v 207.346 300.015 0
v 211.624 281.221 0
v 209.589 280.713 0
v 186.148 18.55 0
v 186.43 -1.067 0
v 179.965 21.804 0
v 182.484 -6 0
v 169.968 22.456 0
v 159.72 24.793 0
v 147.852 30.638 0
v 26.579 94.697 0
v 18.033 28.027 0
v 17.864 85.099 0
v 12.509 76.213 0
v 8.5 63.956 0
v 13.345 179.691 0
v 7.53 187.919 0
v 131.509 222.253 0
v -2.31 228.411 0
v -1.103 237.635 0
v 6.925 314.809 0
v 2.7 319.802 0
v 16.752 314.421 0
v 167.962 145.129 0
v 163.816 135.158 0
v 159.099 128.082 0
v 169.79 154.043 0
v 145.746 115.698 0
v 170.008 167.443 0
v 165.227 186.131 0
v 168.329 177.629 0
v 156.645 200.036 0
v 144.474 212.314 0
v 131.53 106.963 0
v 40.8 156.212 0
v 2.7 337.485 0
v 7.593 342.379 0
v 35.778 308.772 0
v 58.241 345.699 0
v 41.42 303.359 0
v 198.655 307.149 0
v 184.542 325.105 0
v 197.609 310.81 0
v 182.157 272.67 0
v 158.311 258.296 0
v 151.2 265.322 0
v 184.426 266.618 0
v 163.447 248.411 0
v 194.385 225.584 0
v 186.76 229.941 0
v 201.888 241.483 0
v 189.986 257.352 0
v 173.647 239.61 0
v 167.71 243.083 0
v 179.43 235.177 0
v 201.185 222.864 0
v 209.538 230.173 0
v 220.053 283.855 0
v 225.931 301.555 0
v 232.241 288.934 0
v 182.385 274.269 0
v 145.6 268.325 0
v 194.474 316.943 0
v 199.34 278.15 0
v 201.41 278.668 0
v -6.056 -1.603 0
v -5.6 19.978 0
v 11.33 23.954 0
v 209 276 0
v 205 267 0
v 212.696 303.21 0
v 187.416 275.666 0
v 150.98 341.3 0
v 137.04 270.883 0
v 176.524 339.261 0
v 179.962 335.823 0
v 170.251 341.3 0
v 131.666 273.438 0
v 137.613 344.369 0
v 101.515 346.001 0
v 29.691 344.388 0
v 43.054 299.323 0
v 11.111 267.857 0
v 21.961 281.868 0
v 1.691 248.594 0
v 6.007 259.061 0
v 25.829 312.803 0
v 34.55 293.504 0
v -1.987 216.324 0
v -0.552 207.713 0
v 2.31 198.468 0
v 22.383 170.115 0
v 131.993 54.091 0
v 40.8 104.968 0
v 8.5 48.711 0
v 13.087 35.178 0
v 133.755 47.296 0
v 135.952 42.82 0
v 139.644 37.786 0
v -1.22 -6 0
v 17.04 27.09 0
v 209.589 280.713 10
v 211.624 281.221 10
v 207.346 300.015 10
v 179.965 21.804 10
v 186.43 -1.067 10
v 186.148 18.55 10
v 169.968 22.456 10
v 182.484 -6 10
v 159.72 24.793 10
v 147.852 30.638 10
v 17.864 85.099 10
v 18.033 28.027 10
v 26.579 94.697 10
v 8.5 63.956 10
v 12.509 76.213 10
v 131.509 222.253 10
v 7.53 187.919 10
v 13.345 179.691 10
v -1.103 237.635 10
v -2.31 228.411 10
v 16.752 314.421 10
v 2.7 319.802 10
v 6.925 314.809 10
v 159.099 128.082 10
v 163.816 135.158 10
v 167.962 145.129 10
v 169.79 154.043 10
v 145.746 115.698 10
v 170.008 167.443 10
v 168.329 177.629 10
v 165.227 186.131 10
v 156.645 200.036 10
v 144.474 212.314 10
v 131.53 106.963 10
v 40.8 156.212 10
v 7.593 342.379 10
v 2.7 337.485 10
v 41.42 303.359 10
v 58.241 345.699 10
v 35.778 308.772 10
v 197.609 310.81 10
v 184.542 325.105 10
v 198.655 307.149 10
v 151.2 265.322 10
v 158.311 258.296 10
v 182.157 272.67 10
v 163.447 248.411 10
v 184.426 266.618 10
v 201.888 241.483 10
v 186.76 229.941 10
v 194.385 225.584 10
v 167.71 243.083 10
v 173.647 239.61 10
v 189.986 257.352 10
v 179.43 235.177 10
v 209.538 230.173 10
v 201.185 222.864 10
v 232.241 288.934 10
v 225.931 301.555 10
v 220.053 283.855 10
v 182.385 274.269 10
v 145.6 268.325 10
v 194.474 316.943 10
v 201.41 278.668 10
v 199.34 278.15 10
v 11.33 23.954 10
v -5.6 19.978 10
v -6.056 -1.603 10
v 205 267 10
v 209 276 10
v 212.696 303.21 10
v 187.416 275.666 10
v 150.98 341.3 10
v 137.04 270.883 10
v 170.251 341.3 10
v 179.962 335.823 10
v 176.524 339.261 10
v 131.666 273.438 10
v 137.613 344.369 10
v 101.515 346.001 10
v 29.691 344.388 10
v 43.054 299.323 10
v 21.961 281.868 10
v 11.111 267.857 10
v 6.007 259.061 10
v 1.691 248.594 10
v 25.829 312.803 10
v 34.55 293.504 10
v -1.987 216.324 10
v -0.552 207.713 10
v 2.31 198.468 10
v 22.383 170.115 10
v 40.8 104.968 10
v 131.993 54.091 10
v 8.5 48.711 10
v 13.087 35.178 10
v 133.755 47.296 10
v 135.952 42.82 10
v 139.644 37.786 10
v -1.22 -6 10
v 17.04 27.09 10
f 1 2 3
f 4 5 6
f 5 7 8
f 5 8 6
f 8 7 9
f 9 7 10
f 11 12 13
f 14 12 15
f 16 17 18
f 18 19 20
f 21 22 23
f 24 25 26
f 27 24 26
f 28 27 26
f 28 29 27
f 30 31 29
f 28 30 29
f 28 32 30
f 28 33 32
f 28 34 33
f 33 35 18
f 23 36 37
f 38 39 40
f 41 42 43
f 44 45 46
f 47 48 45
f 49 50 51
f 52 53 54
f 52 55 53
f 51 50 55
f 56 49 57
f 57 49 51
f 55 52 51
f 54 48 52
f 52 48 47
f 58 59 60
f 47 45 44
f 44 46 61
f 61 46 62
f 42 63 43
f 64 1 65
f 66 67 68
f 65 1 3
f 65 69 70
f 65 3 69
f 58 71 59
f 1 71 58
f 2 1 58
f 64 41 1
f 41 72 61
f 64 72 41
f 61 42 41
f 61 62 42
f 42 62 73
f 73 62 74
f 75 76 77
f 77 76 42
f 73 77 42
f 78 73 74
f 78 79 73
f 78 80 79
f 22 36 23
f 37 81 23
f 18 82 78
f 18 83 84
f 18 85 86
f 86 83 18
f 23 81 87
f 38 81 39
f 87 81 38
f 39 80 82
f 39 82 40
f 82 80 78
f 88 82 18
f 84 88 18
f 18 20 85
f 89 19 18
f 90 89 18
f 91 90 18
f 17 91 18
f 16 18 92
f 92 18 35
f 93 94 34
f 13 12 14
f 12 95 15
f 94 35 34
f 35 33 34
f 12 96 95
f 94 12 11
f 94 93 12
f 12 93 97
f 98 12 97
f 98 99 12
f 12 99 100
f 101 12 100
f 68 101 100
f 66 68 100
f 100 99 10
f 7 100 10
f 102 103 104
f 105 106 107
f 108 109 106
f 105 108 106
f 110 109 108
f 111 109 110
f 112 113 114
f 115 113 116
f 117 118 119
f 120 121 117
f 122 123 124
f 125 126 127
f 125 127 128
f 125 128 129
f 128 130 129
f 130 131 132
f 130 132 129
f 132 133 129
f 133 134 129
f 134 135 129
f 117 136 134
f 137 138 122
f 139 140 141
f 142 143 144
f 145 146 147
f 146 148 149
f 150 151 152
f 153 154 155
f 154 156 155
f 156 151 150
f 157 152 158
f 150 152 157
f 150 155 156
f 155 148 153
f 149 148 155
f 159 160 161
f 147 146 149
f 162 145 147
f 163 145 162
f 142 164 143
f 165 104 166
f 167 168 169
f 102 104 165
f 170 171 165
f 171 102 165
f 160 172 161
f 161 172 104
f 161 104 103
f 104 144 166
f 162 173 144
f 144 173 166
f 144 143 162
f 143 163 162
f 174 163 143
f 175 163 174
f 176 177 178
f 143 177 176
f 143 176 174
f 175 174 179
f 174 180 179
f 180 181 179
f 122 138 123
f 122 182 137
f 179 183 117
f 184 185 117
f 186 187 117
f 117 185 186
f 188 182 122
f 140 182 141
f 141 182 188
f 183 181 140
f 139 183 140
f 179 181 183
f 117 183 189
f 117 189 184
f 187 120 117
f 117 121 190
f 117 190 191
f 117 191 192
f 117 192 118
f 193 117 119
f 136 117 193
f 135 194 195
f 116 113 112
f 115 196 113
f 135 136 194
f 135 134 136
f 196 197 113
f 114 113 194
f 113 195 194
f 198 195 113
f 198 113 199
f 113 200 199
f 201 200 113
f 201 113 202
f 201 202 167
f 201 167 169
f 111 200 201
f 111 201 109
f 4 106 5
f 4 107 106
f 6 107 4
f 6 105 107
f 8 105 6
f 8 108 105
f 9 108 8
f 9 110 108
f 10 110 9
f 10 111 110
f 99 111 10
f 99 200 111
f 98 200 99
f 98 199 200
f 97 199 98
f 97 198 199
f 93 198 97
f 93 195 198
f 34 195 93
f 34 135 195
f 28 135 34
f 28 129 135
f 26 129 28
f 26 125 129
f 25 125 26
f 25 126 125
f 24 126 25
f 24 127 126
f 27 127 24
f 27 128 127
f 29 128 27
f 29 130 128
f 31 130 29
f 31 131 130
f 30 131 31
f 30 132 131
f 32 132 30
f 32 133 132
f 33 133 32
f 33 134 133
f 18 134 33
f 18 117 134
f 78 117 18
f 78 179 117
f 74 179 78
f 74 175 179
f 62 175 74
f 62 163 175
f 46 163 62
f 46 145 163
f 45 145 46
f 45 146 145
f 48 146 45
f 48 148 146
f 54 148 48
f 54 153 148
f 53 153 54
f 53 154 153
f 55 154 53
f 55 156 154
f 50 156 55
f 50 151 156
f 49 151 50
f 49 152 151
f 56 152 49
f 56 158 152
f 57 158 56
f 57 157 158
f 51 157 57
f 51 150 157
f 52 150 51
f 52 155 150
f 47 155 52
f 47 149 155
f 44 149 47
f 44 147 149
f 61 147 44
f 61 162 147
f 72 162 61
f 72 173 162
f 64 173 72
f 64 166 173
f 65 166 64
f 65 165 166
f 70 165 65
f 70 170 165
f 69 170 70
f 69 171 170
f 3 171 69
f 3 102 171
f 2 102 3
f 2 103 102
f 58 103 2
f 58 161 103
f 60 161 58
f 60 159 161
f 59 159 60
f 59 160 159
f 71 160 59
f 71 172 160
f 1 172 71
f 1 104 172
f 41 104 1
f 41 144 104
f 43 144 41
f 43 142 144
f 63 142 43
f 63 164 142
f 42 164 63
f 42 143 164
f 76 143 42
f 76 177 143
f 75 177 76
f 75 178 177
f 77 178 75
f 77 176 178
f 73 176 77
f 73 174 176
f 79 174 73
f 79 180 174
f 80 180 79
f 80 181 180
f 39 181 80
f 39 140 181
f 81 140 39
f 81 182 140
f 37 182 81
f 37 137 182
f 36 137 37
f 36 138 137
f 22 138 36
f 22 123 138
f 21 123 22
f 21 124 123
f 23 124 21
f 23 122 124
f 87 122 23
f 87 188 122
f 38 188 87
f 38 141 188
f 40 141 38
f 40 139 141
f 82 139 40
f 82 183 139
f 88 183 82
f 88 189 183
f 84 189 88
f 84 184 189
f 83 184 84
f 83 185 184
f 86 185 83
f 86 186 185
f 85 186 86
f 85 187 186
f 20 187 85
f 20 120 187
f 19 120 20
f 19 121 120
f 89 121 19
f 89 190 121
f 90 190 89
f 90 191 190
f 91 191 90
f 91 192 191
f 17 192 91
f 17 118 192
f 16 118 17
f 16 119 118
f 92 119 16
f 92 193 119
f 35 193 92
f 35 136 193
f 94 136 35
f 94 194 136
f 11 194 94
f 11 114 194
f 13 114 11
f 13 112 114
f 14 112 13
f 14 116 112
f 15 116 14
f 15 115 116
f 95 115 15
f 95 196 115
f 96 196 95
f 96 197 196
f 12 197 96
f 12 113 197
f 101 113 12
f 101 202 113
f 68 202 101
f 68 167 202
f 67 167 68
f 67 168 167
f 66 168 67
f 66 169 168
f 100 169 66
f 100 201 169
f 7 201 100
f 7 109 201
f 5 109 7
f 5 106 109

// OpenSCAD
// Snake "I" traced from images/snake-trace-sheet.jpg (front view).
// The outline is the solid silhouette of the front view (cap, head, open jaw,
// neck, DNA column and base), flood-filled from the drawing's black linework
// and mapped into a 210 x 340 box (y up).

H_BOX = 340;

snake_outline = [
    [10.3, 336.6],
    [8.7, 335.0],
    [8.7, 322.0],
    [9.8, 320.7],
    [17.4, 320.4],
    [27.5, 318.6],
    [39.1, 313.9],
    [46.5, 306.8],
    [49.9, 298.4],
    [49.7, 296.6],
    [38.3, 288.8],
    [26.4, 277.8],
    [16.1, 264.5],
    [11.4, 256.4],
    [7.4, 246.7],
    [4.8, 236.5],
    [3.7, 228.1],
    [4.0, 216.9],
    [5.3, 209.1],
    [7.9, 200.7],
    [12.7, 191.0],
    [18.0, 183.5],
    [26.4, 174.6],
    [46.8, 159.2],
    [46.8, 101.9],
    [30.6, 90.2],
    [22.7, 81.5],
    [18.0, 73.7],
    [14.5, 63.0],
    [14.5, 49.7],
    [18.5, 37.9],
    [25.9, 27.2],
    [20.6, 22.2],
    [13.5, 18.3],
    [0.3, 15.2],
    [0.0, 1.0],
    [1.1, 0.0],
    [179.6, 0.0],
    [180.4, 1.0],
    [180.2, 14.9],
    [178.3, 15.9],
    [169.1, 16.5],
    [157.7, 19.1],
    [144.5, 25.6],
    [135.2, 33.7],
    [130.8, 39.7],
    [128.1, 45.2],
    [126.0, 53.3],
    [125.5, 110.3],
    [142.1, 120.5],
    [154.5, 132.0],
    [158.5, 138.0],
    [162.2, 146.9],
    [163.8, 154.7],
    [164.0, 167.0],
    [162.5, 176.1],
    [159.8, 183.5],
    [151.9, 196.3],
    [140.5, 207.8],
    [125.5, 219.3],
    [125.7, 284.6],
    [126.5, 285.1],
    [133.1, 279.4],
    [139.2, 276.5],
    [147.9, 273.9],
    [154.8, 270.2],
    [163.2, 261.9],
    [168.5, 251.7],
    [171.7, 247.7],
    [177.0, 244.6],
    [183.0, 240.0],
    [190.0, 235.0],
    [197.0, 231.0],
    [200.0, 229.8],
    [201.6, 231.2],
    [197.0, 238.0],
    [191.0, 246.0],
    [185.0, 254.0],
    [179.0, 264.0],
    [176.0, 272.0],
    [177.0, 279.0],
    [186.0, 281.5],
    [198.0, 284.0],
    [210.0, 287.0],
    [218.0, 289.5],
    [224.0, 292.0],
    [222.0, 296.0],
    [214.0, 297.0],
    [206.8, 292.7],
    [193.4, 303.7],
    [192.0, 308.6],
    [189.7, 313.1],
    [179.6, 321.4],
    [174.9, 332.4],
    [173.3, 334.0],
    [169.3, 335.3],
    [150.3, 335.3],
    [136.8, 338.4],
    [101.4, 340.0],
    [58.4, 339.7],
    [30.1, 338.4]
];

// Outward offset makes the snake body thicker than the traced line art.
SNAKE_BODY_GROW = 6;

// The mouth gap is part of snake_outline; the outward offset keeps it open at the throat.
// Upper fang hangs from the upper jaw; the lower jaw is toothless.
module snake_fangs_2d() {
    polygon([[199.0, 292.0], [211.0, 292.0], [209.0, 276.0],
             [205.0, 267.0], [201.0, 280.0]]);
}

module snake_body_2d() {
    union() {
        offset(delta = SNAKE_BODY_GROW)
            polygon(snake_outline);
        snake_fangs_2d();
    }
}

// Diffuser recess shapes in the same 210 x 340 box: eye, jaw line and helix stripes.
module snake_band(a, b, r) {
    hull() {
        translate(a) circle(r = r);
        translate(b) circle(r = r);
    }
}

// Helix rungs: an even ladder of diagonal slots across the helix band, rising to the right
// at about 30 degrees, as in the Inner Diffuser Outline on the Snake-I trace sheet.
module snake_detail_2d() {
    snake_band([138, 248], [182, 256], 1.6);
    for (i = [0 : 9]) {
        y = 30 + i * 30;
        snake_band([44, y], [150, y + 58], 2.2);
    }
}

module snake_i_2d(w = 210, h = 340) {
    scale([w / 210, h / H_BOX])
        snake_body_2d();
}

// 3D snake: a rounded tube standing proud of the diffuser front, with an open jaw and fangs.
// Coordinates are the 210 x 340 box (x right, y up); z is depth, positive toward the viewer.
SNAKE_TUBE_R = 6;

// Spine points are [x, y, depth]. Depth swings in front of the diffuser so the body wraps the column.
snake_spine = [[182, 262, 13], [150, 256, 11], [118, 244, 8], [85, 230, 7], [54, 204, 11],
               [33, 170, 15], [38, 130, 10], [62, 96, 7], [96, 64, 9], [130, 42, 13], [160, 30, 10],
               [122, 16, 12], [80, 8, 16], [44, 16, 12]];

// Sphere scaled so it stays round after the part selector's X/Z scale: wx, wz are world mm per box unit.
module snake_ball(p, r, wx, wz) {
    translate(p) scale([r / wx, r / wz, r]) sphere(r = 1, $fn = 24);
}

module snake_chain(pts, wx, wz) {
    for (i = [0 : len(pts) - 2])
        hull() {
            snake_ball(pts[i], SNAKE_TUBE_R, wx, wz);
            snake_ball(pts[i + 1], SNAKE_TUBE_R, wx, wz);
        }
}

// Skull with an eye socket; upper and lower jaws are separate hulls, opened wide at the snout.
module snake_head_3d(wx, wz) {
    difference() {
        union() {
            hull() {
                snake_ball([158, 274, 15], 15, wx, wz);
                snake_ball([180, 282, 13], 12, wx, wz);
            }
            hull() {
                snake_ball([166, 282, 12], 10, wx, wz);
                snake_ball([206, 290, 9], 6, wx, wz);
            }
            hull() {
                snake_ball([160, 258, 10], 9, wx, wz);
                snake_ball([202, 250, 7], 5, wx, wz);
            }
            // Fangs hang from the upper jaw and rise from the lower jaw
            translate([198, 288, 9]) rotate([90, 0, 0]) cylinder(h = 16, r1 = 3.2, r2 = 0.4, $fn = 12);
            translate([194, 250, 8]) rotate([-90, 0, 0]) cylinder(h = 14, r1 = 3, r2 = 0.4, $fn = 12);
            // Smaller teeth along the jaw edges
            for (t = [[180, 280, 90], [194, 283, 90]])
                translate([t[0], t[1], 9]) rotate([t[2], 0, 0]) cylinder(h = 5, r1 = 1.8, r2 = 0.3, $fn = 10);
            for (t = [[180, 262, -90], [192, 256, -90]])
                translate([t[0], t[1], 9]) rotate([t[2], 0, 0]) cylinder(h = 5, r1 = 1.8, r2 = 0.3, $fn = 10);
        }
        snake_ball([170, 284, 21], 4.5, wx, wz);
    }
}

module snake_3d_body(wx = 1, wz = 1) {
    snake_chain(snake_spine, wx, wz);
    snake_head_3d(wx, wz);
}

// Preview when this file is opened directly; ignored when used by engenesis_lamp.scad.
linear_extrude(height = 10) snake_i_2d(210, 340);
